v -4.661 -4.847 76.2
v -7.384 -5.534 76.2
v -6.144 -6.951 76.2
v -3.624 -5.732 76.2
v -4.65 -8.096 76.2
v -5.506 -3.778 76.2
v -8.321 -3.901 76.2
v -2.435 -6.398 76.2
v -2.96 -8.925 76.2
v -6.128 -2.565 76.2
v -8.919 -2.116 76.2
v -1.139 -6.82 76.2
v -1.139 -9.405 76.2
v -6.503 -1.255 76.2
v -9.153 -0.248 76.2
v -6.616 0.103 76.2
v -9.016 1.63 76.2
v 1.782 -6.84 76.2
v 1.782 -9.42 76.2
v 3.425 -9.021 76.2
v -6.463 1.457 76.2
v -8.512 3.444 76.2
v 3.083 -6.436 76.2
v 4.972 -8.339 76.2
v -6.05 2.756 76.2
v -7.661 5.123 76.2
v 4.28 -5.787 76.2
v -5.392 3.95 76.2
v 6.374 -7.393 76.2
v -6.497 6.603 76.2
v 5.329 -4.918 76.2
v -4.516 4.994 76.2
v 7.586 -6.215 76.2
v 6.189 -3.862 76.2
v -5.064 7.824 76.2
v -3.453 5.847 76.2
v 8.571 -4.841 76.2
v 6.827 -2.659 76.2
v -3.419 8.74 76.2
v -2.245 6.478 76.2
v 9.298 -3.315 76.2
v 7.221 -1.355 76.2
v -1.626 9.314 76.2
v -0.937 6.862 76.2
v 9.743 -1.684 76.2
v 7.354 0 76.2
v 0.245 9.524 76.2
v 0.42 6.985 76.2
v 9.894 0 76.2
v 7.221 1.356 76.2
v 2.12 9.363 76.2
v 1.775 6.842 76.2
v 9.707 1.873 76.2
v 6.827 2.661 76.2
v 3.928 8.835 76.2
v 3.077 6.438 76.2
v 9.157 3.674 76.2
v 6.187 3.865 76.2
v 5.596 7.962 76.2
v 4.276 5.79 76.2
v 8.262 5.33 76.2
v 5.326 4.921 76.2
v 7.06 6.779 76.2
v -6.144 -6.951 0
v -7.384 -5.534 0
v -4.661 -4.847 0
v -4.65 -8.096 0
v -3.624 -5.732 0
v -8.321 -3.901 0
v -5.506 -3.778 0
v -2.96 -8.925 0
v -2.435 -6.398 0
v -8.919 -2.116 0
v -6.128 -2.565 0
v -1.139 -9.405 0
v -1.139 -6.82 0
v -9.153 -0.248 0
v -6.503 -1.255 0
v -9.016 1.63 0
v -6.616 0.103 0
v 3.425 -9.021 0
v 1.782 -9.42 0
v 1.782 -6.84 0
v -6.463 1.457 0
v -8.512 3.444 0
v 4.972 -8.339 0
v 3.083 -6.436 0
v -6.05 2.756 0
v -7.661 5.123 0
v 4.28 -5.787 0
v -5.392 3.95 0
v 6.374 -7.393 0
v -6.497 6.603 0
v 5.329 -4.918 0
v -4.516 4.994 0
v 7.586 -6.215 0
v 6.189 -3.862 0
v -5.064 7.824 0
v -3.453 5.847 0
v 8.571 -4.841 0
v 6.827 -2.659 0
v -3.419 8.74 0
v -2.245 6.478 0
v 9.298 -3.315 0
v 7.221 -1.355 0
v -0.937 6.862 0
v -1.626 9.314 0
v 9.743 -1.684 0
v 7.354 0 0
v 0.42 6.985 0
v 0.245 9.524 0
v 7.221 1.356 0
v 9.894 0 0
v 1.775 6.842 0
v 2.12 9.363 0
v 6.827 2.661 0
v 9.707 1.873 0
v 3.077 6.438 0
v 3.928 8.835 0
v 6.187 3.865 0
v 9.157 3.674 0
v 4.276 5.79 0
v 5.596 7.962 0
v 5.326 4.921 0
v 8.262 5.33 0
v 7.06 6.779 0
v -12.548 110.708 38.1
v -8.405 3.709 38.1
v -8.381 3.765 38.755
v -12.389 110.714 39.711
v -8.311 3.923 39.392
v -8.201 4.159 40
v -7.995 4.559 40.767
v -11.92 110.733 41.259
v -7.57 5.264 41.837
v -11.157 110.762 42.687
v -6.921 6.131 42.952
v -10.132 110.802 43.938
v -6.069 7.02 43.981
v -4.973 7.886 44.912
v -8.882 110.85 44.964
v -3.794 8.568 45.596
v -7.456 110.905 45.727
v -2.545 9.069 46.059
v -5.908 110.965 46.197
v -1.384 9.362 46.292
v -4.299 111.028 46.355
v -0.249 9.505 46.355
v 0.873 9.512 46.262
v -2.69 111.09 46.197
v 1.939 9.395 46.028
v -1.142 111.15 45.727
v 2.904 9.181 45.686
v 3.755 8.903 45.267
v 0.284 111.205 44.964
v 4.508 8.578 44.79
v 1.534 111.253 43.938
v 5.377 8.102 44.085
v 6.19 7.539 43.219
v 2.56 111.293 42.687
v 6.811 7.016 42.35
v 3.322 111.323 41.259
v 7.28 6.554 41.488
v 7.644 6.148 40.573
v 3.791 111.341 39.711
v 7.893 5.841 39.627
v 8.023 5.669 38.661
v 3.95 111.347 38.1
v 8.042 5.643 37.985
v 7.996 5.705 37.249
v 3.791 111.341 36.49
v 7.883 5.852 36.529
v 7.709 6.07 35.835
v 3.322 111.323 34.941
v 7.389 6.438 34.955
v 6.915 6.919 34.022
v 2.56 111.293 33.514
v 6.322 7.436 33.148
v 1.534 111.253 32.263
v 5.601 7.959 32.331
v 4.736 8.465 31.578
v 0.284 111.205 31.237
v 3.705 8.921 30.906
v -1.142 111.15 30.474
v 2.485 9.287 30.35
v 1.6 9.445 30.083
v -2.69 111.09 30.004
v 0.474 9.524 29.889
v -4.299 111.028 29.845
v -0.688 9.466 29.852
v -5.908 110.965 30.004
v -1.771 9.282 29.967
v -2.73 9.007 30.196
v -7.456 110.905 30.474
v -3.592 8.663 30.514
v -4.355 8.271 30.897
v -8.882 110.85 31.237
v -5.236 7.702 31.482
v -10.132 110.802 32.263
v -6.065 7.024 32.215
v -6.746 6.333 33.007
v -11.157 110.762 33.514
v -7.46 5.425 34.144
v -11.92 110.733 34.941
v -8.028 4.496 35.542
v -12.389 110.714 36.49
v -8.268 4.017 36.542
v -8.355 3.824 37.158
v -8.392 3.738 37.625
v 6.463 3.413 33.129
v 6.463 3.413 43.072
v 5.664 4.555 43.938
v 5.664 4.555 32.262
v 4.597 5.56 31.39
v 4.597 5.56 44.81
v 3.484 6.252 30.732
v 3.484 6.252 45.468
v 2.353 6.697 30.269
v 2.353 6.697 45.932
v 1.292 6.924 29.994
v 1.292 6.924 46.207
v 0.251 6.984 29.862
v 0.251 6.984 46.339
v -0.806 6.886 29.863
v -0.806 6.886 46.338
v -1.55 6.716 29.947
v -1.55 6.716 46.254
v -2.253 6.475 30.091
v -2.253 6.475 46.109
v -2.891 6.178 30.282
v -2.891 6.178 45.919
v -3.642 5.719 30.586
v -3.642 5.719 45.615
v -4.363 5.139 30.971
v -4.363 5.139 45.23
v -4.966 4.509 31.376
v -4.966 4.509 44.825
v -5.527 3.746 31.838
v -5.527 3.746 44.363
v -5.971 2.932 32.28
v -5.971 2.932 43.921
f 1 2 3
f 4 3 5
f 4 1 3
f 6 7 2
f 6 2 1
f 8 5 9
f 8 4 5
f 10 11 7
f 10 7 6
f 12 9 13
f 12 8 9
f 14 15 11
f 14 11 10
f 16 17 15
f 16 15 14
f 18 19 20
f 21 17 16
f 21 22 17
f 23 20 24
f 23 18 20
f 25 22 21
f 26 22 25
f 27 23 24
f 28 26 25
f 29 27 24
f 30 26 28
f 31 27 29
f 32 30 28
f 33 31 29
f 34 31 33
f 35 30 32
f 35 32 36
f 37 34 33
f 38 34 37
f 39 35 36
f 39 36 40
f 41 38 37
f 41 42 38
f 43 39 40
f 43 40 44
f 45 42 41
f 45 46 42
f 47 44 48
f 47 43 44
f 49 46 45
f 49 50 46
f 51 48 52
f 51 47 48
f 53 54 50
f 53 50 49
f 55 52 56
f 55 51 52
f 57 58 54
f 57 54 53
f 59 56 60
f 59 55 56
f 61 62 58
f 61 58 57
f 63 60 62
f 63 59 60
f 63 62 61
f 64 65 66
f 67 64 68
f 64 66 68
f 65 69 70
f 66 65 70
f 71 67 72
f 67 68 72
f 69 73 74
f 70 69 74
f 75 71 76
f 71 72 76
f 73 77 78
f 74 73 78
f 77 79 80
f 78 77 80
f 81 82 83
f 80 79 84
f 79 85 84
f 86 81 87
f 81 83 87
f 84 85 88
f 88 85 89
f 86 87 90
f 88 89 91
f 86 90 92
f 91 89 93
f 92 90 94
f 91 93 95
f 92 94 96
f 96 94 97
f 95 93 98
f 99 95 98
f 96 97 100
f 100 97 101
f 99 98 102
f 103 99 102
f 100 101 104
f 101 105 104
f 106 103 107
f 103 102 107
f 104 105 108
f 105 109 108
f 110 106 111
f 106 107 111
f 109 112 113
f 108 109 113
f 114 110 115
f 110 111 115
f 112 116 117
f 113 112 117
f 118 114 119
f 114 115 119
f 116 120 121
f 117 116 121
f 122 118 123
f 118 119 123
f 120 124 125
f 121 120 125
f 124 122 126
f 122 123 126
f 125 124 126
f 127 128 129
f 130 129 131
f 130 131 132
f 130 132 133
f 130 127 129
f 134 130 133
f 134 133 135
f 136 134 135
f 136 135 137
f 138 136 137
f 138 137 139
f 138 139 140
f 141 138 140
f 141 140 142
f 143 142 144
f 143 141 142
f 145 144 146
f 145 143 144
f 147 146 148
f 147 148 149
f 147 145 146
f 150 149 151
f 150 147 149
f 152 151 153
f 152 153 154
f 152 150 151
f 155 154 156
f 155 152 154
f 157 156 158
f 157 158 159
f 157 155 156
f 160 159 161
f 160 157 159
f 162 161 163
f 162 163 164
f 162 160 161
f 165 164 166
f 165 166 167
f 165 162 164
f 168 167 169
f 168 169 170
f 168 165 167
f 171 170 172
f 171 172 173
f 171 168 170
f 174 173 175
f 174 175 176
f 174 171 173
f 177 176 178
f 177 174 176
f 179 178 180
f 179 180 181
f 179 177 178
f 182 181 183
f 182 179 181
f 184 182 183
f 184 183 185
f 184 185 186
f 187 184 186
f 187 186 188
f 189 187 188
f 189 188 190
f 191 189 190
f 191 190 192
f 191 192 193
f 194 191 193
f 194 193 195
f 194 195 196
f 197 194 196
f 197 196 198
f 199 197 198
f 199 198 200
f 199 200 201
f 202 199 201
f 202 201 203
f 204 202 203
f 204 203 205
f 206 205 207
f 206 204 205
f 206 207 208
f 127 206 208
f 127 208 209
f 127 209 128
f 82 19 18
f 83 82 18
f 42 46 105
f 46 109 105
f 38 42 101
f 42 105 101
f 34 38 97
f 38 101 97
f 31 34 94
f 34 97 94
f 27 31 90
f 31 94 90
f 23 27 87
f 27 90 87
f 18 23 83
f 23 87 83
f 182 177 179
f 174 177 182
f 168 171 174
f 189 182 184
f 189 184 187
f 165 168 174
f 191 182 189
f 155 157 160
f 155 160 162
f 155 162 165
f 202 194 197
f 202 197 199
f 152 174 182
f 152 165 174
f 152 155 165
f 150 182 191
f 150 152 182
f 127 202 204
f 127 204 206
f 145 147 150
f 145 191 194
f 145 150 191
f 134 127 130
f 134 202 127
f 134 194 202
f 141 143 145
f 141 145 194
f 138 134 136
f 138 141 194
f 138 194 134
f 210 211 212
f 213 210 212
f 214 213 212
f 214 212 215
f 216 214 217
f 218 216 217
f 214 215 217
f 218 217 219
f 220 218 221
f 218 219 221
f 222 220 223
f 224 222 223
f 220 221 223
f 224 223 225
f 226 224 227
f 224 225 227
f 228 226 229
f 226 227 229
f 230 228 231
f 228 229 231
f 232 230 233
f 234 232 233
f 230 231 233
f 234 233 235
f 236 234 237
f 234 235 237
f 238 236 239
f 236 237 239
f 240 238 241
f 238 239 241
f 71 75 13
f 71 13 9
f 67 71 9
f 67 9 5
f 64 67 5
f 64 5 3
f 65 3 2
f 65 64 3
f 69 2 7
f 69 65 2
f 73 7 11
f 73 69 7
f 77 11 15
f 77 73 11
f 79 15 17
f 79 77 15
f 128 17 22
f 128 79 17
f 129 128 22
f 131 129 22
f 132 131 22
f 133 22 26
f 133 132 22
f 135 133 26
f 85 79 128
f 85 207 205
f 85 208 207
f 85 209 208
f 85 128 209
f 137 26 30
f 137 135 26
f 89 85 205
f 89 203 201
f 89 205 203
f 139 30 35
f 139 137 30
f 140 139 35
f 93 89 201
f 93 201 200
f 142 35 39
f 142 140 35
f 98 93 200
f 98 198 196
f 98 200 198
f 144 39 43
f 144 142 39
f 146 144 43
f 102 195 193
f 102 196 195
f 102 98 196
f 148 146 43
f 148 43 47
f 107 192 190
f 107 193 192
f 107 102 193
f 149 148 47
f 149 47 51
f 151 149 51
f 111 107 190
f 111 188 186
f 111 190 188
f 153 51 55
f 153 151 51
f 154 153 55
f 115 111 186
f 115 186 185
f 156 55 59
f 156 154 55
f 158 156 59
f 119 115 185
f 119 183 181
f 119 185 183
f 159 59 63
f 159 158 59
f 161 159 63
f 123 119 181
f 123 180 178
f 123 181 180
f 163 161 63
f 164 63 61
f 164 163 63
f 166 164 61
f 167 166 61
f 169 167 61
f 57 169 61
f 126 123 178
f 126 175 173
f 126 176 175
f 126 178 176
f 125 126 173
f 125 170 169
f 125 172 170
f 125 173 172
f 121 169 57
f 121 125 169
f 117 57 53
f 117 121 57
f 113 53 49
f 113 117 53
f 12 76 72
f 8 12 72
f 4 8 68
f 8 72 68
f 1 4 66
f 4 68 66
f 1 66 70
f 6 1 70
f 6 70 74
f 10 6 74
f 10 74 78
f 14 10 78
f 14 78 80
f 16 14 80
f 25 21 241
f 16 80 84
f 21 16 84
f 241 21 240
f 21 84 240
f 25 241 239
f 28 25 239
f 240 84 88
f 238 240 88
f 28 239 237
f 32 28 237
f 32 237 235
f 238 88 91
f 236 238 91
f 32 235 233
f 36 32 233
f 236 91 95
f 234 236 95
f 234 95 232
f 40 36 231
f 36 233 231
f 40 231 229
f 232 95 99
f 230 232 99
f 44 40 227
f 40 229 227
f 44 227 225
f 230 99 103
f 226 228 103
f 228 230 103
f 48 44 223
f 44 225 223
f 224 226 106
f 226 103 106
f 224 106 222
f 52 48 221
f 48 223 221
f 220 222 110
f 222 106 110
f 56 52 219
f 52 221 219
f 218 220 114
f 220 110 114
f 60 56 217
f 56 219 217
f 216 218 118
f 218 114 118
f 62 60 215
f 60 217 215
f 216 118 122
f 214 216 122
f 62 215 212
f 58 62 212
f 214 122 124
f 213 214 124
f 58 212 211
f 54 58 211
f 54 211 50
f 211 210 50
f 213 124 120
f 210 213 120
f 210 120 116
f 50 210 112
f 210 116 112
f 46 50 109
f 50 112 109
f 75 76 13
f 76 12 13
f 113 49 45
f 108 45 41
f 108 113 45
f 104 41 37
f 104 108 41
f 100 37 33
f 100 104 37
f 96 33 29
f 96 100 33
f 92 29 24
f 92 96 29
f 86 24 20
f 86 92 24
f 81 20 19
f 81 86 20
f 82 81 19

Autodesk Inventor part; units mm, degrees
ref_plane "YZ Plane" through (0, 0, 0) normal (1, 0, 0) x (0, 1, 0)
ref_plane "XZ Plane" through (0, 0, 0) normal (0, 1, 0) x (-1, 0, 0)
sketch "Sketch1" plane through (0, 0, 0) normal (0, 0, 1) x (1, 0, 0)
  circle A0 centre (0.3685, 0) radius 9.525
  circle A1 centre (0.3685, 0) radius 6.985
  point P0 (0, 0)
  dimension "d0" = 19.05
  dimension "d1" = 2.54
extrude "Extrusion1" add sketch "Sketch1" along normal blind 76.2
sketch "Sketch2" plane through (0.3685, 0, 76.2) normal (0, 0, 1) x (1, 0, 0)
  circle A0 centre (0, 0) radius 6.985 projected
  circle A1 centre (0, 0) radius 9.525 projected
  point P0 (-0.3685, 0)
  point P1 (-0.3685, 9.5179)
ref_plane "Work Plane1" through (0, 9.5179, 76.2) normal (-0.0386902, 0.9992513, 0) x (-0.9992513, -0.0386902, 0)
sketch "Sketch3" plane through (0, 9.5179, 76.2) normal (-0.0386902, 0.9992513, 0) x (-0.9992513, -0.0386902, 0)
  line L0 (0.3682, 0.0009) -> (0.3682, -76.2) construction
  circle A0 centre (0.3682, -38.0996) radius 8.255
  dimension "d4" = 16.51
extrude "Extrusion2" add sketch "Sketch3" along normal blind 101.6 and the other way blind 6.35
sketch "Sketch4" plane through (0.3685, 0, 76.2) normal (0, 0, 1) x (1, 0, 0)
  line L0 (-1.5078, -6.8203) -> (-1.5078, -9.4049)
  line L1 (1.4136, -9.4195) -> (1.4136, -6.8405)
  arc A0 (-1.5078, -9.4049) -> (1.4136, -9.4195) centre (0, 0) ccw
  arc A1 (1.4136, -6.8405) -> (-1.5078, -6.8203) centre (0, 0) ccw
extrude "Extrusion3" cut sketch "Sketch4" against normal blind 101.6
properties part number "centerSpike" material "Iron, Cast"
